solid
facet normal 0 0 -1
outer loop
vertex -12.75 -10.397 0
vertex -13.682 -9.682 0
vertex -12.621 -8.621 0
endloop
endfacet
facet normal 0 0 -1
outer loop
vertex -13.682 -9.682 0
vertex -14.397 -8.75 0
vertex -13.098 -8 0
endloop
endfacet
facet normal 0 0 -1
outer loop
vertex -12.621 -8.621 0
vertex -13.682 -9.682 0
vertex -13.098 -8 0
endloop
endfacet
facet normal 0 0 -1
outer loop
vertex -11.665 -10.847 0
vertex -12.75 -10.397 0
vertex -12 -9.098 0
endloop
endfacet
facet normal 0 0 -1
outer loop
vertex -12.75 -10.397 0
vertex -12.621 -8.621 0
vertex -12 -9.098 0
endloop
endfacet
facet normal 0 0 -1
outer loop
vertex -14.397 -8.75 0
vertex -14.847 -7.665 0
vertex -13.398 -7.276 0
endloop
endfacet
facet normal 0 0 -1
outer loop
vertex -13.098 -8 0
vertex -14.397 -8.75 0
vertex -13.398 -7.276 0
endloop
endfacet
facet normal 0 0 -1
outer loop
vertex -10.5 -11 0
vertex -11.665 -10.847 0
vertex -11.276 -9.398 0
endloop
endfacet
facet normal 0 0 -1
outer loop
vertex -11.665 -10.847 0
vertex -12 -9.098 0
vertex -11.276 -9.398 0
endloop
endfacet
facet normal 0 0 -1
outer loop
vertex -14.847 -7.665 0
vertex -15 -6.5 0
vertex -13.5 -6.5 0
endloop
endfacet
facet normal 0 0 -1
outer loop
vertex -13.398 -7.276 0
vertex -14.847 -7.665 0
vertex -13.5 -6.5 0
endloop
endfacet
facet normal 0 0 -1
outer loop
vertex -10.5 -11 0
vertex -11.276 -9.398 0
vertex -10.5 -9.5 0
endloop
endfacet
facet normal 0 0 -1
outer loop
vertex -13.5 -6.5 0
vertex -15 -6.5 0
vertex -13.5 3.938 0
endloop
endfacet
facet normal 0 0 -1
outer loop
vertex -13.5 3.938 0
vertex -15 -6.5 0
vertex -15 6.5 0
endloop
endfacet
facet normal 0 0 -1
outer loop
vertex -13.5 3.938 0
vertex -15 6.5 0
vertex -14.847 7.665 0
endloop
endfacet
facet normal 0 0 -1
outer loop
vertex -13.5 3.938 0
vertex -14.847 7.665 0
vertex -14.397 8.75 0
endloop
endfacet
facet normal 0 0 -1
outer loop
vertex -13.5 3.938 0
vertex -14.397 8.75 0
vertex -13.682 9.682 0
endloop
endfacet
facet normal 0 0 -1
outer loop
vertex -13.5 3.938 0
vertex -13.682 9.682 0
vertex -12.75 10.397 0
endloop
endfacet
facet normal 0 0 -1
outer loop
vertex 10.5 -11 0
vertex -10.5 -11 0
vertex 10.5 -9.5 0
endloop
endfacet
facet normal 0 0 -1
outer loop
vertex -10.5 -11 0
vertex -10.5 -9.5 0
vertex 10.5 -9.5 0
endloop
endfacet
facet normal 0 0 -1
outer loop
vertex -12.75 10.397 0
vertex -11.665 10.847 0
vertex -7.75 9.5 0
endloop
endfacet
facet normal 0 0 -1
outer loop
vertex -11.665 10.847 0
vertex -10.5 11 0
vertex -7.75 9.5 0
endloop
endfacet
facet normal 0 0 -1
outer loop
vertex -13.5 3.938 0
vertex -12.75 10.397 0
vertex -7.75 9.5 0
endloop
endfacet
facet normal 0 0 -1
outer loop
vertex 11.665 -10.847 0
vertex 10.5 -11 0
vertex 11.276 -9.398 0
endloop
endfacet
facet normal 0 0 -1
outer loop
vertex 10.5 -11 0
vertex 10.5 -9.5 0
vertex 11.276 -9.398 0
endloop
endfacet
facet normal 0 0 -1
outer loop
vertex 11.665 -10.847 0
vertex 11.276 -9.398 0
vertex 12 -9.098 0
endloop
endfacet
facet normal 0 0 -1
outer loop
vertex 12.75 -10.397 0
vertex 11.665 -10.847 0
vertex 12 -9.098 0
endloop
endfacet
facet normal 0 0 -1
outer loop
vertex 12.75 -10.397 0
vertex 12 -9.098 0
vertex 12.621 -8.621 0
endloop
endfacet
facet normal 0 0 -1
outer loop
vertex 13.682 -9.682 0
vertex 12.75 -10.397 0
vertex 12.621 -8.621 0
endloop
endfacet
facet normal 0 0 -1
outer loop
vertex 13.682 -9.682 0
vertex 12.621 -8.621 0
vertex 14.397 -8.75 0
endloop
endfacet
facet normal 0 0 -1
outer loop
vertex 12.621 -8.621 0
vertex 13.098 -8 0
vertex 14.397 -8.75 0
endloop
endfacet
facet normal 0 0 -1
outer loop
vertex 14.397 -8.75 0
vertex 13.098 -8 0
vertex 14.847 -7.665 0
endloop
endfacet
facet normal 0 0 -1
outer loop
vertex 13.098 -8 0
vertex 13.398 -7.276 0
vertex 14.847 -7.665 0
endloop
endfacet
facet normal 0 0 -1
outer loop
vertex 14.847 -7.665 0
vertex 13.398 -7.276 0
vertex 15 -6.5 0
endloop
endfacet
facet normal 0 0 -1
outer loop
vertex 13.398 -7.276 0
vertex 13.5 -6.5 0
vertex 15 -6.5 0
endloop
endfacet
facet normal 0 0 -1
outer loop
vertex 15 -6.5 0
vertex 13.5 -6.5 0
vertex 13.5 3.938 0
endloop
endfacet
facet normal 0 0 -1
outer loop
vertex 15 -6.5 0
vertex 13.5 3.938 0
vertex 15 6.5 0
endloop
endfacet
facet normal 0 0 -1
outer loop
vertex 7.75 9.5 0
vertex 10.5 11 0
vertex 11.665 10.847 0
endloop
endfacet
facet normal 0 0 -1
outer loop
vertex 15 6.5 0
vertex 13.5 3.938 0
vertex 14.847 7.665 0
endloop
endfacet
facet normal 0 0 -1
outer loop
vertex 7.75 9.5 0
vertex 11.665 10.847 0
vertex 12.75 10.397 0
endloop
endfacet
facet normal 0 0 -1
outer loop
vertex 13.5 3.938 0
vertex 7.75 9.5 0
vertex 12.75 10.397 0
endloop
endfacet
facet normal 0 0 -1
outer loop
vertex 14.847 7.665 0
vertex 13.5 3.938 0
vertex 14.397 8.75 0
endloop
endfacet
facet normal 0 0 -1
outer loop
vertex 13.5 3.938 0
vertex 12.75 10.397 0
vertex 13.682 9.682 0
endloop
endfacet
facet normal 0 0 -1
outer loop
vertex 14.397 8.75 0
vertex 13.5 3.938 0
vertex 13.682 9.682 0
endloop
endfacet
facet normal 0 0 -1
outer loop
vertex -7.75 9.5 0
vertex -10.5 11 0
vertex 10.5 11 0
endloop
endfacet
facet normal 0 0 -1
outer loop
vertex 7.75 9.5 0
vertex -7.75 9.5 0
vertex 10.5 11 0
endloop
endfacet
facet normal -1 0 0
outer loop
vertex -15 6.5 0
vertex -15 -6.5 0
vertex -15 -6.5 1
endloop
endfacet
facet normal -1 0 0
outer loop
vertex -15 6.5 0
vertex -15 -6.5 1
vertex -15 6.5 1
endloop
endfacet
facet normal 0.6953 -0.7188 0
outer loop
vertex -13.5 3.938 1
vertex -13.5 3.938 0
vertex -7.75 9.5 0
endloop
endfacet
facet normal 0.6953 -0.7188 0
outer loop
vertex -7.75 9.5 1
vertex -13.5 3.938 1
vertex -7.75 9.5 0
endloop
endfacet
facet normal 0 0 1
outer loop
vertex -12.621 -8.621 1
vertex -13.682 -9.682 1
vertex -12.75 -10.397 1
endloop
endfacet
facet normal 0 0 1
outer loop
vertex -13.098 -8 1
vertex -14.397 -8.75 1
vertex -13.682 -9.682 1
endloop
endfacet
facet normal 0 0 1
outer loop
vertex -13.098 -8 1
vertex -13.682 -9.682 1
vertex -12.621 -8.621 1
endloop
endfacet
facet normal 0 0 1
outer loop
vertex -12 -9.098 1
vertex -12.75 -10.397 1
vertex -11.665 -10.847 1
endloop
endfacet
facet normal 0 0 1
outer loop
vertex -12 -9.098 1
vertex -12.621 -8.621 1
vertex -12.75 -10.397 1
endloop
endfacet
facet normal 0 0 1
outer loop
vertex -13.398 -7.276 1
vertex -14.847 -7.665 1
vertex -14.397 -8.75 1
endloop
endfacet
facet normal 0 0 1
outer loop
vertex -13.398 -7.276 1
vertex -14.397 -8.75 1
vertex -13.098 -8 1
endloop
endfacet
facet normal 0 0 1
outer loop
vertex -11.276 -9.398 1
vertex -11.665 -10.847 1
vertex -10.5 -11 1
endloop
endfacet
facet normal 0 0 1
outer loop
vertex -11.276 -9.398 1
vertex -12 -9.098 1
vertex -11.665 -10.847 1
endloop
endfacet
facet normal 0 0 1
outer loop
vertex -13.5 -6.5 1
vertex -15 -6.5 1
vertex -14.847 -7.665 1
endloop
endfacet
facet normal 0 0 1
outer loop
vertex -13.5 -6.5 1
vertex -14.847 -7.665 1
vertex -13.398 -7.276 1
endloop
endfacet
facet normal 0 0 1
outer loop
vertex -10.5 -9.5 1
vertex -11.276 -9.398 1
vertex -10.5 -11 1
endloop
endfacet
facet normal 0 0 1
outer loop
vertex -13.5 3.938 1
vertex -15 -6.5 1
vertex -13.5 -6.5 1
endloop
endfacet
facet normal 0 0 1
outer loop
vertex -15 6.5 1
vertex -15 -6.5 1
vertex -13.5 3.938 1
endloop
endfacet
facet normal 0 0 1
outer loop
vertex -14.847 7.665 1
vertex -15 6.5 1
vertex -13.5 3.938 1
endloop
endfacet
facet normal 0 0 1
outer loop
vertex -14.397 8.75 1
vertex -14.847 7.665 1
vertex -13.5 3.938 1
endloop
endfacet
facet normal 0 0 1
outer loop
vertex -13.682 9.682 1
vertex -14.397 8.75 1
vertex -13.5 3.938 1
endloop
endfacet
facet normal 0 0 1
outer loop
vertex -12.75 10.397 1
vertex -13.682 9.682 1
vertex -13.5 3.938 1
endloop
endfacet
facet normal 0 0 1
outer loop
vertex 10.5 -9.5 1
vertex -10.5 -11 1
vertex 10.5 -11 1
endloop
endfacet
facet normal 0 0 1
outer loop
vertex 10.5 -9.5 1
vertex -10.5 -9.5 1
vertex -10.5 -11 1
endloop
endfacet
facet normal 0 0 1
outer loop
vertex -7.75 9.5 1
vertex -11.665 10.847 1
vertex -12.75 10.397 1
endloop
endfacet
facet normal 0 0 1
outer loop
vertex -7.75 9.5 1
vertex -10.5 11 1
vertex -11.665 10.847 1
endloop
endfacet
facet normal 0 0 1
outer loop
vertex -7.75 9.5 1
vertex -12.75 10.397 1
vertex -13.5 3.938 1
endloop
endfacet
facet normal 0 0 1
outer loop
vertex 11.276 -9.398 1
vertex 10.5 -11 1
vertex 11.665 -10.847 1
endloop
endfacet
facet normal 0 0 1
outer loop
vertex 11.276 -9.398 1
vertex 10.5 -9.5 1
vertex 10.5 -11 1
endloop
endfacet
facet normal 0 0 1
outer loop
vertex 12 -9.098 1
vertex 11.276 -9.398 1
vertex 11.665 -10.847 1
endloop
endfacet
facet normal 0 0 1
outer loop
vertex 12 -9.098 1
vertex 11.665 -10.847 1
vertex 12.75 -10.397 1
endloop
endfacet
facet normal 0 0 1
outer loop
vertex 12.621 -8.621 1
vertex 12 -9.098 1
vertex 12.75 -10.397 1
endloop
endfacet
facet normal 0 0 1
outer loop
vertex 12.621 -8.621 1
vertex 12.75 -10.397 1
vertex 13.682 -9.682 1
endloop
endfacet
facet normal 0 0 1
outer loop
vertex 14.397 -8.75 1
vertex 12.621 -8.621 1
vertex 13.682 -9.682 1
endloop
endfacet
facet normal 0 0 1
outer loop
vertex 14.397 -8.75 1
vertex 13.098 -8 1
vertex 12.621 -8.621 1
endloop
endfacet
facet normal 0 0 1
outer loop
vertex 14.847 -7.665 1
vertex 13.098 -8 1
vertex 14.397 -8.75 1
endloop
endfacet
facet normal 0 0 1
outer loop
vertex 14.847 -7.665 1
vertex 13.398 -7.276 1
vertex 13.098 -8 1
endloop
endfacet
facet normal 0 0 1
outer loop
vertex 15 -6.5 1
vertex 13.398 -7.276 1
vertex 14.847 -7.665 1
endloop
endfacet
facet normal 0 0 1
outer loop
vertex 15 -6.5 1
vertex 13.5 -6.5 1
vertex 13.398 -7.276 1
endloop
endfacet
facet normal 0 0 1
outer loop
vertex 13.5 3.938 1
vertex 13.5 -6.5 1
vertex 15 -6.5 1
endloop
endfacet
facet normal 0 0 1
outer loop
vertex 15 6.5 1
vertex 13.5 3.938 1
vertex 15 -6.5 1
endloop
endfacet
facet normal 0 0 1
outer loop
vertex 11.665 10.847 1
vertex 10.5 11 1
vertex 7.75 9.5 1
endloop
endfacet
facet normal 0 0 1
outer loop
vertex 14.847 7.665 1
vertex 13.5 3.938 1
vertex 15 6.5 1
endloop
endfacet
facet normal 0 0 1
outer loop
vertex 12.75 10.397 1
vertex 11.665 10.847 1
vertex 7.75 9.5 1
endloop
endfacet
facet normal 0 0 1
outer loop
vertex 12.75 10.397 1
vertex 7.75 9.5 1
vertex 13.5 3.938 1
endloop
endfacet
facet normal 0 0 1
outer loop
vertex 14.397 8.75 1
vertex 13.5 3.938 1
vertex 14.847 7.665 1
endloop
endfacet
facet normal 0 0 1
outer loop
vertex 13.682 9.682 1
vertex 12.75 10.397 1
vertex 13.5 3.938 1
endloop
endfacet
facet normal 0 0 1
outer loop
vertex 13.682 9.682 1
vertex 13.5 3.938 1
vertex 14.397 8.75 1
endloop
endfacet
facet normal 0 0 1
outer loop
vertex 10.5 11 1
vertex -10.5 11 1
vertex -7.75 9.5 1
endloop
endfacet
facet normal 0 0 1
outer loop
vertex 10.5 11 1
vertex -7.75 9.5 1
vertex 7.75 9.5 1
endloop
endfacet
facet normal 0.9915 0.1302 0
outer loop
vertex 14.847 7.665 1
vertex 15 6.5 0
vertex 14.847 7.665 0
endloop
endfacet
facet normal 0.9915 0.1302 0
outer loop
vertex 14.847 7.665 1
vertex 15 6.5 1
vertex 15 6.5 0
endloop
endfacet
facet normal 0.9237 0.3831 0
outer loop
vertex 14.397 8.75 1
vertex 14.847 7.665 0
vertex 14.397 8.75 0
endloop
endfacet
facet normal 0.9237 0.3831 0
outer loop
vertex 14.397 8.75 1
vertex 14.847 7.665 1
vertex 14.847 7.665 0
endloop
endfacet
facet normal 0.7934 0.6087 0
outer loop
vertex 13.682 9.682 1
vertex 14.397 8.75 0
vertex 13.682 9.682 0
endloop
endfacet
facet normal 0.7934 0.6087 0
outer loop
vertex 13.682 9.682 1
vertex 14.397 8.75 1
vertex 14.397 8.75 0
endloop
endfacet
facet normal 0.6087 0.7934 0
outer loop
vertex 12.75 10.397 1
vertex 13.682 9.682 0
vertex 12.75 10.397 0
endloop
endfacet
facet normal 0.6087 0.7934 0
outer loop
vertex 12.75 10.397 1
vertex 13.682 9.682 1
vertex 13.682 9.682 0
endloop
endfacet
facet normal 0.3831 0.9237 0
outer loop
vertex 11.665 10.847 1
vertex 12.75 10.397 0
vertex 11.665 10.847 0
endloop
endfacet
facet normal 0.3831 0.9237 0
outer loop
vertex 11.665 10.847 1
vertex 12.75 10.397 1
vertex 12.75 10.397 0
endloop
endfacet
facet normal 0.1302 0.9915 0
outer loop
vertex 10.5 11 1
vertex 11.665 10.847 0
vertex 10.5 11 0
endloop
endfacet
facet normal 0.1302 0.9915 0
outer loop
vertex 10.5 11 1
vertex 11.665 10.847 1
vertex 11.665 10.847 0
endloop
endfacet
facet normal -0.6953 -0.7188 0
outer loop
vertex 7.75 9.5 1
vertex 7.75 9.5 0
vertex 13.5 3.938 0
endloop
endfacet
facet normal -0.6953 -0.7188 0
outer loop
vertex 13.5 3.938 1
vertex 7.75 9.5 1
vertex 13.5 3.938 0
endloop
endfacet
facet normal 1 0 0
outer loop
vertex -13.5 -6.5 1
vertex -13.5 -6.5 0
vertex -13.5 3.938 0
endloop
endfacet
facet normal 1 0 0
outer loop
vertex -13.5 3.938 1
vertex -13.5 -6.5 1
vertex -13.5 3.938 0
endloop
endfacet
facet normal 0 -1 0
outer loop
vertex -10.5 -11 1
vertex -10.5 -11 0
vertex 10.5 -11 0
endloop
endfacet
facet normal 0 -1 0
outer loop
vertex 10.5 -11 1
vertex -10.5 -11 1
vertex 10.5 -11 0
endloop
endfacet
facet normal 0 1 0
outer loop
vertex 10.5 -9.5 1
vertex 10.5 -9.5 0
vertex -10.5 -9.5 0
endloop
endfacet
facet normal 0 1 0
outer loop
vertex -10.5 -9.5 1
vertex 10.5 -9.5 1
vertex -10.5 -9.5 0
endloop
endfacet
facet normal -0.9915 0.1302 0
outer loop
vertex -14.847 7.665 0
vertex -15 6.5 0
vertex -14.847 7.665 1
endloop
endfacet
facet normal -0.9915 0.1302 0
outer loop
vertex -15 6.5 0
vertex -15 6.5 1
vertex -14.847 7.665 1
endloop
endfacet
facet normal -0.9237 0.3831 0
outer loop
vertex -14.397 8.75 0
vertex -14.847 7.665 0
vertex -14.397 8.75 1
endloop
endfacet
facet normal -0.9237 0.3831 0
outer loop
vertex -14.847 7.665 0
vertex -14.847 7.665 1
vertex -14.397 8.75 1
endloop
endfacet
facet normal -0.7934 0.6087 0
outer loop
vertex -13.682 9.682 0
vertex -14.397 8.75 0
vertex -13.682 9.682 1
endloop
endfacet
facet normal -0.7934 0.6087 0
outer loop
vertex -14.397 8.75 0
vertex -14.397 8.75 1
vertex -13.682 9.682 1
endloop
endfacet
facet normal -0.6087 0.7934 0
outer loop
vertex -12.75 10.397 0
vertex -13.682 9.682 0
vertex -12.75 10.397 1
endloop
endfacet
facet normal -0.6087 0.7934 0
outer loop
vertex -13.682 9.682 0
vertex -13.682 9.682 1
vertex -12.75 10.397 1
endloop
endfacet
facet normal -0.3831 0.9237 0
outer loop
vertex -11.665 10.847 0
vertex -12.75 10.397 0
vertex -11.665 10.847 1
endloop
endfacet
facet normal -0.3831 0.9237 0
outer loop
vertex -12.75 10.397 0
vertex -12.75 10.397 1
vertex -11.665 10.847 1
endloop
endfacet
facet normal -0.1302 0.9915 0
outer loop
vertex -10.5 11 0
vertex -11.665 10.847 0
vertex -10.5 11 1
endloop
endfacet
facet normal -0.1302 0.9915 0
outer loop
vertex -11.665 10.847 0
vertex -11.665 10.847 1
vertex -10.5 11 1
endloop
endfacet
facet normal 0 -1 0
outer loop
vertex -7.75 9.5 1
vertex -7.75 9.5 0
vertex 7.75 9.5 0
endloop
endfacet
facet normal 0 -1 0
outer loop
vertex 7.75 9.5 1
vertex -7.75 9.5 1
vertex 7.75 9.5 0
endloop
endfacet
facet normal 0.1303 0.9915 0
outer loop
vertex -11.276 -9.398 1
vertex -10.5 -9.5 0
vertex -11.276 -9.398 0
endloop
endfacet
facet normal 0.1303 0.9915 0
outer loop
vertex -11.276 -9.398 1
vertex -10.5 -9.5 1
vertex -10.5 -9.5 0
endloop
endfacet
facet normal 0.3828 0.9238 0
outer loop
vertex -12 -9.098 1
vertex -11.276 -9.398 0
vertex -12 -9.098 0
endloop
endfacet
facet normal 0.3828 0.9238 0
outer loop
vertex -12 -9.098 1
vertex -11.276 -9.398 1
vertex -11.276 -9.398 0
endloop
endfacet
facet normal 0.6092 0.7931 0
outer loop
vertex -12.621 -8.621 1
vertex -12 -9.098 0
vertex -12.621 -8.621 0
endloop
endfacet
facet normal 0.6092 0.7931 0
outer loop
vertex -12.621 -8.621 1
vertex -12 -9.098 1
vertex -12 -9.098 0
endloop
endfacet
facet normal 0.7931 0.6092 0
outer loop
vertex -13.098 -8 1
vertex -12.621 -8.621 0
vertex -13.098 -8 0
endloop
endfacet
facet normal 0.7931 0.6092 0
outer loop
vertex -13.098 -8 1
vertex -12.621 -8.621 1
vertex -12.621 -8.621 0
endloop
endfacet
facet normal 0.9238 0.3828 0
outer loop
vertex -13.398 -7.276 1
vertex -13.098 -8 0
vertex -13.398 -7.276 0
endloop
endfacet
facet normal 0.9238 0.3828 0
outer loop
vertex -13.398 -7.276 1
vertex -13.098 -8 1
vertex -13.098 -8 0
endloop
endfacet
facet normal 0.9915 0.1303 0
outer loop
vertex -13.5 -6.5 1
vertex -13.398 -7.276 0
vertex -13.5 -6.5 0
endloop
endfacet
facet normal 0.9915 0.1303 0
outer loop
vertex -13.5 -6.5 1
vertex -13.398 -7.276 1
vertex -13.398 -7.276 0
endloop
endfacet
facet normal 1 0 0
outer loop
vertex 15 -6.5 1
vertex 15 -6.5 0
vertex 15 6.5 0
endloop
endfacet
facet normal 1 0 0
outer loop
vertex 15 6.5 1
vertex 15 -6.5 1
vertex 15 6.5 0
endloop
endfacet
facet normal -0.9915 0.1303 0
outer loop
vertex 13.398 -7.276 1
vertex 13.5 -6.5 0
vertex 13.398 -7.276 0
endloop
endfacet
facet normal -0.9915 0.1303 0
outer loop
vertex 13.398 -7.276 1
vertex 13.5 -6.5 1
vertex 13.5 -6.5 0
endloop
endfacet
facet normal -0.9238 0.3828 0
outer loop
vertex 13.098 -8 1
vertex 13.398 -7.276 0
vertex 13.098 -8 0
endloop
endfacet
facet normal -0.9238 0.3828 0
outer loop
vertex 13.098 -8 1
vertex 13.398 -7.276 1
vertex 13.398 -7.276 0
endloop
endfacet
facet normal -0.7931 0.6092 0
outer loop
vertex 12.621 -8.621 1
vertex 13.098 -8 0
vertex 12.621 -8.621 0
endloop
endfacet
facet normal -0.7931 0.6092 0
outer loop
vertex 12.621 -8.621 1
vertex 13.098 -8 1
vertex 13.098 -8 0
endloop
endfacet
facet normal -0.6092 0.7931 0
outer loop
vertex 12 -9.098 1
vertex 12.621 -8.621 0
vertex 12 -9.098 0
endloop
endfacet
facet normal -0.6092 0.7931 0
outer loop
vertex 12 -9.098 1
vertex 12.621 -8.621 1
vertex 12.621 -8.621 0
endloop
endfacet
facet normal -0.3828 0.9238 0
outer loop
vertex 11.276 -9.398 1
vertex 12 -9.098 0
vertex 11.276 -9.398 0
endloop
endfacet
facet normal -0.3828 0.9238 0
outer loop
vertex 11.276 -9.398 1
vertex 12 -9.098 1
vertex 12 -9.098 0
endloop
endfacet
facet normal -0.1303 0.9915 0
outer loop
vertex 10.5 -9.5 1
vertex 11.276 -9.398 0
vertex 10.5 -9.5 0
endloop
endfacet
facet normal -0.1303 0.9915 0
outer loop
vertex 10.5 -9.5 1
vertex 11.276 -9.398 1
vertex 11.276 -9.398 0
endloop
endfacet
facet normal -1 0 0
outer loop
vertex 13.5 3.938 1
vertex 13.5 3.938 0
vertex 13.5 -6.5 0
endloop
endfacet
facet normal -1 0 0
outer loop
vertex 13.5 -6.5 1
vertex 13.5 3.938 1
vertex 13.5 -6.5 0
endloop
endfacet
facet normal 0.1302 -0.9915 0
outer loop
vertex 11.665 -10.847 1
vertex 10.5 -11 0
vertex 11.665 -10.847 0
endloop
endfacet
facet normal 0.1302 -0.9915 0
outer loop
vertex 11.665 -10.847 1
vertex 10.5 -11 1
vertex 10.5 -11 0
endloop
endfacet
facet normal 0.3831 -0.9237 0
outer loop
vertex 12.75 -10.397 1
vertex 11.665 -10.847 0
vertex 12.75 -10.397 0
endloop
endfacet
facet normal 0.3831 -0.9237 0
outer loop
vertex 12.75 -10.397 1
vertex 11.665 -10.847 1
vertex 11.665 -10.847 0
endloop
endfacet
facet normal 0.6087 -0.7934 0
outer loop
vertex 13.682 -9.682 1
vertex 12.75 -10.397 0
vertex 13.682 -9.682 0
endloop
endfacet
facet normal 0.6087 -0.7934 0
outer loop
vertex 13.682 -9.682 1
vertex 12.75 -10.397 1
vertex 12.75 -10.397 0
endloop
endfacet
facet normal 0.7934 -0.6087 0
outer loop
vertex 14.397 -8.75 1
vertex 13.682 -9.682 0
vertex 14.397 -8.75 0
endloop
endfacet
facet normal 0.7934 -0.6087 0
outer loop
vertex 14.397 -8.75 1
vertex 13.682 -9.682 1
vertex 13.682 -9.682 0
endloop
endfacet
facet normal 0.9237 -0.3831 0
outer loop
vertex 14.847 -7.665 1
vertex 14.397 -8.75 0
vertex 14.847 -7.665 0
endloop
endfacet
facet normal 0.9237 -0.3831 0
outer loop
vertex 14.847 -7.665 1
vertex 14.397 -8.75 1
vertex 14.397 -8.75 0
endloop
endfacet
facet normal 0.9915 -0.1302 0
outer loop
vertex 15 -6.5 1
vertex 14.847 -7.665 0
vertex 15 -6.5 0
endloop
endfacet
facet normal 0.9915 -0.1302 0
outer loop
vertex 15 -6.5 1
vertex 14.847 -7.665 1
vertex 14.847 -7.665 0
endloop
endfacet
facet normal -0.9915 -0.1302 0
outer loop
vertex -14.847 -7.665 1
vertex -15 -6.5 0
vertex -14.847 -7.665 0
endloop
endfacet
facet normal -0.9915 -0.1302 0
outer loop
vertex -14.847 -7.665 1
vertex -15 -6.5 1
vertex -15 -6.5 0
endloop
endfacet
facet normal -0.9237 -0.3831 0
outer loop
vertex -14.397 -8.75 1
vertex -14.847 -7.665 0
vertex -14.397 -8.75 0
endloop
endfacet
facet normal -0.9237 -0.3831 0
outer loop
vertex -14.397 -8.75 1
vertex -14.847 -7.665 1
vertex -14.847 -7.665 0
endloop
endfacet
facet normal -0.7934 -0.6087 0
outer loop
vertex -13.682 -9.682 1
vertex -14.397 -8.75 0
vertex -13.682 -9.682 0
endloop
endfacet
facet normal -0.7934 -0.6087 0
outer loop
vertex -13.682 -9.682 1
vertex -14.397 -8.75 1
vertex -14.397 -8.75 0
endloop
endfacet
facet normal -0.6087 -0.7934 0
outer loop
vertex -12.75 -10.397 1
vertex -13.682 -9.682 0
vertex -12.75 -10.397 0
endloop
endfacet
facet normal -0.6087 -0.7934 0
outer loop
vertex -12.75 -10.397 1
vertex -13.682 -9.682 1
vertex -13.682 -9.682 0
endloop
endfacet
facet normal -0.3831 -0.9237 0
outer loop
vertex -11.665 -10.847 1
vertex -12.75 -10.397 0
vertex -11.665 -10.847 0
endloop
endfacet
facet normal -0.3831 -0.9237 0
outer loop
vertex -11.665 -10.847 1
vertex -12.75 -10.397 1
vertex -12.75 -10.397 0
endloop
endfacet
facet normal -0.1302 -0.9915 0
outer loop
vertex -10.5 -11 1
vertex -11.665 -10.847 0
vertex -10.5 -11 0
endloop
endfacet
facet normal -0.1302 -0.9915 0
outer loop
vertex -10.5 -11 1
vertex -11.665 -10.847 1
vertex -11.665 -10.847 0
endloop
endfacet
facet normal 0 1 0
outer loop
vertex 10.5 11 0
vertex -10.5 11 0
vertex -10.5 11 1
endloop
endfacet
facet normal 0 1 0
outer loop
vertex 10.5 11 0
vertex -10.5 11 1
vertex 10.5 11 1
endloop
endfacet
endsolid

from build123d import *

# Parameters (mm, degrees)
F0_W     = 30
F0_H     = 22
F1_DEPTH = 1
F2_R     = 3
F3_R     = 4.5


with BuildPart() as f1:
    # F0 (on Top) → F1 (new body)
    with BuildSketch(Plane.XY):
        Rectangle(F0_W, F0_H)
        Polygon((7.75, 9.5), (13.5, 9.5), (13.5, 3.937851), (13.5, -9.5), (-13.5, -9.5), (-13.5, 3.937851), (-13.5, 9.5), (-7.75, 9.5), align=None, mode=Mode.SUBTRACT)
        Polygon((-13.5, 3.937851), (-7.75, 9.5), (-13.5, 9.5), align=None)
        Polygon((13.5, 3.937851), (13.5, 9.5), (7.75, 9.5), align=None)
    extrude(amount=F1_DEPTH)

    # F2
    f2_edges = [f1.edges().sort_by_distance(p)[0] for p in [
        (13.5, -9.5, 0.5),
        (-13.5, -9.5, 0.5),
    ]]
    fillet(f2_edges, radius=F2_R)

    # F3
    f3_edges = [f1.edges().sort_by_distance(p)[0] for p in [
        (15, -11, 0.5),
        (15, 11, 0.5),
        (-15, -11, 0.5),
        (-15, 11, 0.5),
    ]]
    fillet(f3_edges, radius=F3_R)


solid = f1.part
